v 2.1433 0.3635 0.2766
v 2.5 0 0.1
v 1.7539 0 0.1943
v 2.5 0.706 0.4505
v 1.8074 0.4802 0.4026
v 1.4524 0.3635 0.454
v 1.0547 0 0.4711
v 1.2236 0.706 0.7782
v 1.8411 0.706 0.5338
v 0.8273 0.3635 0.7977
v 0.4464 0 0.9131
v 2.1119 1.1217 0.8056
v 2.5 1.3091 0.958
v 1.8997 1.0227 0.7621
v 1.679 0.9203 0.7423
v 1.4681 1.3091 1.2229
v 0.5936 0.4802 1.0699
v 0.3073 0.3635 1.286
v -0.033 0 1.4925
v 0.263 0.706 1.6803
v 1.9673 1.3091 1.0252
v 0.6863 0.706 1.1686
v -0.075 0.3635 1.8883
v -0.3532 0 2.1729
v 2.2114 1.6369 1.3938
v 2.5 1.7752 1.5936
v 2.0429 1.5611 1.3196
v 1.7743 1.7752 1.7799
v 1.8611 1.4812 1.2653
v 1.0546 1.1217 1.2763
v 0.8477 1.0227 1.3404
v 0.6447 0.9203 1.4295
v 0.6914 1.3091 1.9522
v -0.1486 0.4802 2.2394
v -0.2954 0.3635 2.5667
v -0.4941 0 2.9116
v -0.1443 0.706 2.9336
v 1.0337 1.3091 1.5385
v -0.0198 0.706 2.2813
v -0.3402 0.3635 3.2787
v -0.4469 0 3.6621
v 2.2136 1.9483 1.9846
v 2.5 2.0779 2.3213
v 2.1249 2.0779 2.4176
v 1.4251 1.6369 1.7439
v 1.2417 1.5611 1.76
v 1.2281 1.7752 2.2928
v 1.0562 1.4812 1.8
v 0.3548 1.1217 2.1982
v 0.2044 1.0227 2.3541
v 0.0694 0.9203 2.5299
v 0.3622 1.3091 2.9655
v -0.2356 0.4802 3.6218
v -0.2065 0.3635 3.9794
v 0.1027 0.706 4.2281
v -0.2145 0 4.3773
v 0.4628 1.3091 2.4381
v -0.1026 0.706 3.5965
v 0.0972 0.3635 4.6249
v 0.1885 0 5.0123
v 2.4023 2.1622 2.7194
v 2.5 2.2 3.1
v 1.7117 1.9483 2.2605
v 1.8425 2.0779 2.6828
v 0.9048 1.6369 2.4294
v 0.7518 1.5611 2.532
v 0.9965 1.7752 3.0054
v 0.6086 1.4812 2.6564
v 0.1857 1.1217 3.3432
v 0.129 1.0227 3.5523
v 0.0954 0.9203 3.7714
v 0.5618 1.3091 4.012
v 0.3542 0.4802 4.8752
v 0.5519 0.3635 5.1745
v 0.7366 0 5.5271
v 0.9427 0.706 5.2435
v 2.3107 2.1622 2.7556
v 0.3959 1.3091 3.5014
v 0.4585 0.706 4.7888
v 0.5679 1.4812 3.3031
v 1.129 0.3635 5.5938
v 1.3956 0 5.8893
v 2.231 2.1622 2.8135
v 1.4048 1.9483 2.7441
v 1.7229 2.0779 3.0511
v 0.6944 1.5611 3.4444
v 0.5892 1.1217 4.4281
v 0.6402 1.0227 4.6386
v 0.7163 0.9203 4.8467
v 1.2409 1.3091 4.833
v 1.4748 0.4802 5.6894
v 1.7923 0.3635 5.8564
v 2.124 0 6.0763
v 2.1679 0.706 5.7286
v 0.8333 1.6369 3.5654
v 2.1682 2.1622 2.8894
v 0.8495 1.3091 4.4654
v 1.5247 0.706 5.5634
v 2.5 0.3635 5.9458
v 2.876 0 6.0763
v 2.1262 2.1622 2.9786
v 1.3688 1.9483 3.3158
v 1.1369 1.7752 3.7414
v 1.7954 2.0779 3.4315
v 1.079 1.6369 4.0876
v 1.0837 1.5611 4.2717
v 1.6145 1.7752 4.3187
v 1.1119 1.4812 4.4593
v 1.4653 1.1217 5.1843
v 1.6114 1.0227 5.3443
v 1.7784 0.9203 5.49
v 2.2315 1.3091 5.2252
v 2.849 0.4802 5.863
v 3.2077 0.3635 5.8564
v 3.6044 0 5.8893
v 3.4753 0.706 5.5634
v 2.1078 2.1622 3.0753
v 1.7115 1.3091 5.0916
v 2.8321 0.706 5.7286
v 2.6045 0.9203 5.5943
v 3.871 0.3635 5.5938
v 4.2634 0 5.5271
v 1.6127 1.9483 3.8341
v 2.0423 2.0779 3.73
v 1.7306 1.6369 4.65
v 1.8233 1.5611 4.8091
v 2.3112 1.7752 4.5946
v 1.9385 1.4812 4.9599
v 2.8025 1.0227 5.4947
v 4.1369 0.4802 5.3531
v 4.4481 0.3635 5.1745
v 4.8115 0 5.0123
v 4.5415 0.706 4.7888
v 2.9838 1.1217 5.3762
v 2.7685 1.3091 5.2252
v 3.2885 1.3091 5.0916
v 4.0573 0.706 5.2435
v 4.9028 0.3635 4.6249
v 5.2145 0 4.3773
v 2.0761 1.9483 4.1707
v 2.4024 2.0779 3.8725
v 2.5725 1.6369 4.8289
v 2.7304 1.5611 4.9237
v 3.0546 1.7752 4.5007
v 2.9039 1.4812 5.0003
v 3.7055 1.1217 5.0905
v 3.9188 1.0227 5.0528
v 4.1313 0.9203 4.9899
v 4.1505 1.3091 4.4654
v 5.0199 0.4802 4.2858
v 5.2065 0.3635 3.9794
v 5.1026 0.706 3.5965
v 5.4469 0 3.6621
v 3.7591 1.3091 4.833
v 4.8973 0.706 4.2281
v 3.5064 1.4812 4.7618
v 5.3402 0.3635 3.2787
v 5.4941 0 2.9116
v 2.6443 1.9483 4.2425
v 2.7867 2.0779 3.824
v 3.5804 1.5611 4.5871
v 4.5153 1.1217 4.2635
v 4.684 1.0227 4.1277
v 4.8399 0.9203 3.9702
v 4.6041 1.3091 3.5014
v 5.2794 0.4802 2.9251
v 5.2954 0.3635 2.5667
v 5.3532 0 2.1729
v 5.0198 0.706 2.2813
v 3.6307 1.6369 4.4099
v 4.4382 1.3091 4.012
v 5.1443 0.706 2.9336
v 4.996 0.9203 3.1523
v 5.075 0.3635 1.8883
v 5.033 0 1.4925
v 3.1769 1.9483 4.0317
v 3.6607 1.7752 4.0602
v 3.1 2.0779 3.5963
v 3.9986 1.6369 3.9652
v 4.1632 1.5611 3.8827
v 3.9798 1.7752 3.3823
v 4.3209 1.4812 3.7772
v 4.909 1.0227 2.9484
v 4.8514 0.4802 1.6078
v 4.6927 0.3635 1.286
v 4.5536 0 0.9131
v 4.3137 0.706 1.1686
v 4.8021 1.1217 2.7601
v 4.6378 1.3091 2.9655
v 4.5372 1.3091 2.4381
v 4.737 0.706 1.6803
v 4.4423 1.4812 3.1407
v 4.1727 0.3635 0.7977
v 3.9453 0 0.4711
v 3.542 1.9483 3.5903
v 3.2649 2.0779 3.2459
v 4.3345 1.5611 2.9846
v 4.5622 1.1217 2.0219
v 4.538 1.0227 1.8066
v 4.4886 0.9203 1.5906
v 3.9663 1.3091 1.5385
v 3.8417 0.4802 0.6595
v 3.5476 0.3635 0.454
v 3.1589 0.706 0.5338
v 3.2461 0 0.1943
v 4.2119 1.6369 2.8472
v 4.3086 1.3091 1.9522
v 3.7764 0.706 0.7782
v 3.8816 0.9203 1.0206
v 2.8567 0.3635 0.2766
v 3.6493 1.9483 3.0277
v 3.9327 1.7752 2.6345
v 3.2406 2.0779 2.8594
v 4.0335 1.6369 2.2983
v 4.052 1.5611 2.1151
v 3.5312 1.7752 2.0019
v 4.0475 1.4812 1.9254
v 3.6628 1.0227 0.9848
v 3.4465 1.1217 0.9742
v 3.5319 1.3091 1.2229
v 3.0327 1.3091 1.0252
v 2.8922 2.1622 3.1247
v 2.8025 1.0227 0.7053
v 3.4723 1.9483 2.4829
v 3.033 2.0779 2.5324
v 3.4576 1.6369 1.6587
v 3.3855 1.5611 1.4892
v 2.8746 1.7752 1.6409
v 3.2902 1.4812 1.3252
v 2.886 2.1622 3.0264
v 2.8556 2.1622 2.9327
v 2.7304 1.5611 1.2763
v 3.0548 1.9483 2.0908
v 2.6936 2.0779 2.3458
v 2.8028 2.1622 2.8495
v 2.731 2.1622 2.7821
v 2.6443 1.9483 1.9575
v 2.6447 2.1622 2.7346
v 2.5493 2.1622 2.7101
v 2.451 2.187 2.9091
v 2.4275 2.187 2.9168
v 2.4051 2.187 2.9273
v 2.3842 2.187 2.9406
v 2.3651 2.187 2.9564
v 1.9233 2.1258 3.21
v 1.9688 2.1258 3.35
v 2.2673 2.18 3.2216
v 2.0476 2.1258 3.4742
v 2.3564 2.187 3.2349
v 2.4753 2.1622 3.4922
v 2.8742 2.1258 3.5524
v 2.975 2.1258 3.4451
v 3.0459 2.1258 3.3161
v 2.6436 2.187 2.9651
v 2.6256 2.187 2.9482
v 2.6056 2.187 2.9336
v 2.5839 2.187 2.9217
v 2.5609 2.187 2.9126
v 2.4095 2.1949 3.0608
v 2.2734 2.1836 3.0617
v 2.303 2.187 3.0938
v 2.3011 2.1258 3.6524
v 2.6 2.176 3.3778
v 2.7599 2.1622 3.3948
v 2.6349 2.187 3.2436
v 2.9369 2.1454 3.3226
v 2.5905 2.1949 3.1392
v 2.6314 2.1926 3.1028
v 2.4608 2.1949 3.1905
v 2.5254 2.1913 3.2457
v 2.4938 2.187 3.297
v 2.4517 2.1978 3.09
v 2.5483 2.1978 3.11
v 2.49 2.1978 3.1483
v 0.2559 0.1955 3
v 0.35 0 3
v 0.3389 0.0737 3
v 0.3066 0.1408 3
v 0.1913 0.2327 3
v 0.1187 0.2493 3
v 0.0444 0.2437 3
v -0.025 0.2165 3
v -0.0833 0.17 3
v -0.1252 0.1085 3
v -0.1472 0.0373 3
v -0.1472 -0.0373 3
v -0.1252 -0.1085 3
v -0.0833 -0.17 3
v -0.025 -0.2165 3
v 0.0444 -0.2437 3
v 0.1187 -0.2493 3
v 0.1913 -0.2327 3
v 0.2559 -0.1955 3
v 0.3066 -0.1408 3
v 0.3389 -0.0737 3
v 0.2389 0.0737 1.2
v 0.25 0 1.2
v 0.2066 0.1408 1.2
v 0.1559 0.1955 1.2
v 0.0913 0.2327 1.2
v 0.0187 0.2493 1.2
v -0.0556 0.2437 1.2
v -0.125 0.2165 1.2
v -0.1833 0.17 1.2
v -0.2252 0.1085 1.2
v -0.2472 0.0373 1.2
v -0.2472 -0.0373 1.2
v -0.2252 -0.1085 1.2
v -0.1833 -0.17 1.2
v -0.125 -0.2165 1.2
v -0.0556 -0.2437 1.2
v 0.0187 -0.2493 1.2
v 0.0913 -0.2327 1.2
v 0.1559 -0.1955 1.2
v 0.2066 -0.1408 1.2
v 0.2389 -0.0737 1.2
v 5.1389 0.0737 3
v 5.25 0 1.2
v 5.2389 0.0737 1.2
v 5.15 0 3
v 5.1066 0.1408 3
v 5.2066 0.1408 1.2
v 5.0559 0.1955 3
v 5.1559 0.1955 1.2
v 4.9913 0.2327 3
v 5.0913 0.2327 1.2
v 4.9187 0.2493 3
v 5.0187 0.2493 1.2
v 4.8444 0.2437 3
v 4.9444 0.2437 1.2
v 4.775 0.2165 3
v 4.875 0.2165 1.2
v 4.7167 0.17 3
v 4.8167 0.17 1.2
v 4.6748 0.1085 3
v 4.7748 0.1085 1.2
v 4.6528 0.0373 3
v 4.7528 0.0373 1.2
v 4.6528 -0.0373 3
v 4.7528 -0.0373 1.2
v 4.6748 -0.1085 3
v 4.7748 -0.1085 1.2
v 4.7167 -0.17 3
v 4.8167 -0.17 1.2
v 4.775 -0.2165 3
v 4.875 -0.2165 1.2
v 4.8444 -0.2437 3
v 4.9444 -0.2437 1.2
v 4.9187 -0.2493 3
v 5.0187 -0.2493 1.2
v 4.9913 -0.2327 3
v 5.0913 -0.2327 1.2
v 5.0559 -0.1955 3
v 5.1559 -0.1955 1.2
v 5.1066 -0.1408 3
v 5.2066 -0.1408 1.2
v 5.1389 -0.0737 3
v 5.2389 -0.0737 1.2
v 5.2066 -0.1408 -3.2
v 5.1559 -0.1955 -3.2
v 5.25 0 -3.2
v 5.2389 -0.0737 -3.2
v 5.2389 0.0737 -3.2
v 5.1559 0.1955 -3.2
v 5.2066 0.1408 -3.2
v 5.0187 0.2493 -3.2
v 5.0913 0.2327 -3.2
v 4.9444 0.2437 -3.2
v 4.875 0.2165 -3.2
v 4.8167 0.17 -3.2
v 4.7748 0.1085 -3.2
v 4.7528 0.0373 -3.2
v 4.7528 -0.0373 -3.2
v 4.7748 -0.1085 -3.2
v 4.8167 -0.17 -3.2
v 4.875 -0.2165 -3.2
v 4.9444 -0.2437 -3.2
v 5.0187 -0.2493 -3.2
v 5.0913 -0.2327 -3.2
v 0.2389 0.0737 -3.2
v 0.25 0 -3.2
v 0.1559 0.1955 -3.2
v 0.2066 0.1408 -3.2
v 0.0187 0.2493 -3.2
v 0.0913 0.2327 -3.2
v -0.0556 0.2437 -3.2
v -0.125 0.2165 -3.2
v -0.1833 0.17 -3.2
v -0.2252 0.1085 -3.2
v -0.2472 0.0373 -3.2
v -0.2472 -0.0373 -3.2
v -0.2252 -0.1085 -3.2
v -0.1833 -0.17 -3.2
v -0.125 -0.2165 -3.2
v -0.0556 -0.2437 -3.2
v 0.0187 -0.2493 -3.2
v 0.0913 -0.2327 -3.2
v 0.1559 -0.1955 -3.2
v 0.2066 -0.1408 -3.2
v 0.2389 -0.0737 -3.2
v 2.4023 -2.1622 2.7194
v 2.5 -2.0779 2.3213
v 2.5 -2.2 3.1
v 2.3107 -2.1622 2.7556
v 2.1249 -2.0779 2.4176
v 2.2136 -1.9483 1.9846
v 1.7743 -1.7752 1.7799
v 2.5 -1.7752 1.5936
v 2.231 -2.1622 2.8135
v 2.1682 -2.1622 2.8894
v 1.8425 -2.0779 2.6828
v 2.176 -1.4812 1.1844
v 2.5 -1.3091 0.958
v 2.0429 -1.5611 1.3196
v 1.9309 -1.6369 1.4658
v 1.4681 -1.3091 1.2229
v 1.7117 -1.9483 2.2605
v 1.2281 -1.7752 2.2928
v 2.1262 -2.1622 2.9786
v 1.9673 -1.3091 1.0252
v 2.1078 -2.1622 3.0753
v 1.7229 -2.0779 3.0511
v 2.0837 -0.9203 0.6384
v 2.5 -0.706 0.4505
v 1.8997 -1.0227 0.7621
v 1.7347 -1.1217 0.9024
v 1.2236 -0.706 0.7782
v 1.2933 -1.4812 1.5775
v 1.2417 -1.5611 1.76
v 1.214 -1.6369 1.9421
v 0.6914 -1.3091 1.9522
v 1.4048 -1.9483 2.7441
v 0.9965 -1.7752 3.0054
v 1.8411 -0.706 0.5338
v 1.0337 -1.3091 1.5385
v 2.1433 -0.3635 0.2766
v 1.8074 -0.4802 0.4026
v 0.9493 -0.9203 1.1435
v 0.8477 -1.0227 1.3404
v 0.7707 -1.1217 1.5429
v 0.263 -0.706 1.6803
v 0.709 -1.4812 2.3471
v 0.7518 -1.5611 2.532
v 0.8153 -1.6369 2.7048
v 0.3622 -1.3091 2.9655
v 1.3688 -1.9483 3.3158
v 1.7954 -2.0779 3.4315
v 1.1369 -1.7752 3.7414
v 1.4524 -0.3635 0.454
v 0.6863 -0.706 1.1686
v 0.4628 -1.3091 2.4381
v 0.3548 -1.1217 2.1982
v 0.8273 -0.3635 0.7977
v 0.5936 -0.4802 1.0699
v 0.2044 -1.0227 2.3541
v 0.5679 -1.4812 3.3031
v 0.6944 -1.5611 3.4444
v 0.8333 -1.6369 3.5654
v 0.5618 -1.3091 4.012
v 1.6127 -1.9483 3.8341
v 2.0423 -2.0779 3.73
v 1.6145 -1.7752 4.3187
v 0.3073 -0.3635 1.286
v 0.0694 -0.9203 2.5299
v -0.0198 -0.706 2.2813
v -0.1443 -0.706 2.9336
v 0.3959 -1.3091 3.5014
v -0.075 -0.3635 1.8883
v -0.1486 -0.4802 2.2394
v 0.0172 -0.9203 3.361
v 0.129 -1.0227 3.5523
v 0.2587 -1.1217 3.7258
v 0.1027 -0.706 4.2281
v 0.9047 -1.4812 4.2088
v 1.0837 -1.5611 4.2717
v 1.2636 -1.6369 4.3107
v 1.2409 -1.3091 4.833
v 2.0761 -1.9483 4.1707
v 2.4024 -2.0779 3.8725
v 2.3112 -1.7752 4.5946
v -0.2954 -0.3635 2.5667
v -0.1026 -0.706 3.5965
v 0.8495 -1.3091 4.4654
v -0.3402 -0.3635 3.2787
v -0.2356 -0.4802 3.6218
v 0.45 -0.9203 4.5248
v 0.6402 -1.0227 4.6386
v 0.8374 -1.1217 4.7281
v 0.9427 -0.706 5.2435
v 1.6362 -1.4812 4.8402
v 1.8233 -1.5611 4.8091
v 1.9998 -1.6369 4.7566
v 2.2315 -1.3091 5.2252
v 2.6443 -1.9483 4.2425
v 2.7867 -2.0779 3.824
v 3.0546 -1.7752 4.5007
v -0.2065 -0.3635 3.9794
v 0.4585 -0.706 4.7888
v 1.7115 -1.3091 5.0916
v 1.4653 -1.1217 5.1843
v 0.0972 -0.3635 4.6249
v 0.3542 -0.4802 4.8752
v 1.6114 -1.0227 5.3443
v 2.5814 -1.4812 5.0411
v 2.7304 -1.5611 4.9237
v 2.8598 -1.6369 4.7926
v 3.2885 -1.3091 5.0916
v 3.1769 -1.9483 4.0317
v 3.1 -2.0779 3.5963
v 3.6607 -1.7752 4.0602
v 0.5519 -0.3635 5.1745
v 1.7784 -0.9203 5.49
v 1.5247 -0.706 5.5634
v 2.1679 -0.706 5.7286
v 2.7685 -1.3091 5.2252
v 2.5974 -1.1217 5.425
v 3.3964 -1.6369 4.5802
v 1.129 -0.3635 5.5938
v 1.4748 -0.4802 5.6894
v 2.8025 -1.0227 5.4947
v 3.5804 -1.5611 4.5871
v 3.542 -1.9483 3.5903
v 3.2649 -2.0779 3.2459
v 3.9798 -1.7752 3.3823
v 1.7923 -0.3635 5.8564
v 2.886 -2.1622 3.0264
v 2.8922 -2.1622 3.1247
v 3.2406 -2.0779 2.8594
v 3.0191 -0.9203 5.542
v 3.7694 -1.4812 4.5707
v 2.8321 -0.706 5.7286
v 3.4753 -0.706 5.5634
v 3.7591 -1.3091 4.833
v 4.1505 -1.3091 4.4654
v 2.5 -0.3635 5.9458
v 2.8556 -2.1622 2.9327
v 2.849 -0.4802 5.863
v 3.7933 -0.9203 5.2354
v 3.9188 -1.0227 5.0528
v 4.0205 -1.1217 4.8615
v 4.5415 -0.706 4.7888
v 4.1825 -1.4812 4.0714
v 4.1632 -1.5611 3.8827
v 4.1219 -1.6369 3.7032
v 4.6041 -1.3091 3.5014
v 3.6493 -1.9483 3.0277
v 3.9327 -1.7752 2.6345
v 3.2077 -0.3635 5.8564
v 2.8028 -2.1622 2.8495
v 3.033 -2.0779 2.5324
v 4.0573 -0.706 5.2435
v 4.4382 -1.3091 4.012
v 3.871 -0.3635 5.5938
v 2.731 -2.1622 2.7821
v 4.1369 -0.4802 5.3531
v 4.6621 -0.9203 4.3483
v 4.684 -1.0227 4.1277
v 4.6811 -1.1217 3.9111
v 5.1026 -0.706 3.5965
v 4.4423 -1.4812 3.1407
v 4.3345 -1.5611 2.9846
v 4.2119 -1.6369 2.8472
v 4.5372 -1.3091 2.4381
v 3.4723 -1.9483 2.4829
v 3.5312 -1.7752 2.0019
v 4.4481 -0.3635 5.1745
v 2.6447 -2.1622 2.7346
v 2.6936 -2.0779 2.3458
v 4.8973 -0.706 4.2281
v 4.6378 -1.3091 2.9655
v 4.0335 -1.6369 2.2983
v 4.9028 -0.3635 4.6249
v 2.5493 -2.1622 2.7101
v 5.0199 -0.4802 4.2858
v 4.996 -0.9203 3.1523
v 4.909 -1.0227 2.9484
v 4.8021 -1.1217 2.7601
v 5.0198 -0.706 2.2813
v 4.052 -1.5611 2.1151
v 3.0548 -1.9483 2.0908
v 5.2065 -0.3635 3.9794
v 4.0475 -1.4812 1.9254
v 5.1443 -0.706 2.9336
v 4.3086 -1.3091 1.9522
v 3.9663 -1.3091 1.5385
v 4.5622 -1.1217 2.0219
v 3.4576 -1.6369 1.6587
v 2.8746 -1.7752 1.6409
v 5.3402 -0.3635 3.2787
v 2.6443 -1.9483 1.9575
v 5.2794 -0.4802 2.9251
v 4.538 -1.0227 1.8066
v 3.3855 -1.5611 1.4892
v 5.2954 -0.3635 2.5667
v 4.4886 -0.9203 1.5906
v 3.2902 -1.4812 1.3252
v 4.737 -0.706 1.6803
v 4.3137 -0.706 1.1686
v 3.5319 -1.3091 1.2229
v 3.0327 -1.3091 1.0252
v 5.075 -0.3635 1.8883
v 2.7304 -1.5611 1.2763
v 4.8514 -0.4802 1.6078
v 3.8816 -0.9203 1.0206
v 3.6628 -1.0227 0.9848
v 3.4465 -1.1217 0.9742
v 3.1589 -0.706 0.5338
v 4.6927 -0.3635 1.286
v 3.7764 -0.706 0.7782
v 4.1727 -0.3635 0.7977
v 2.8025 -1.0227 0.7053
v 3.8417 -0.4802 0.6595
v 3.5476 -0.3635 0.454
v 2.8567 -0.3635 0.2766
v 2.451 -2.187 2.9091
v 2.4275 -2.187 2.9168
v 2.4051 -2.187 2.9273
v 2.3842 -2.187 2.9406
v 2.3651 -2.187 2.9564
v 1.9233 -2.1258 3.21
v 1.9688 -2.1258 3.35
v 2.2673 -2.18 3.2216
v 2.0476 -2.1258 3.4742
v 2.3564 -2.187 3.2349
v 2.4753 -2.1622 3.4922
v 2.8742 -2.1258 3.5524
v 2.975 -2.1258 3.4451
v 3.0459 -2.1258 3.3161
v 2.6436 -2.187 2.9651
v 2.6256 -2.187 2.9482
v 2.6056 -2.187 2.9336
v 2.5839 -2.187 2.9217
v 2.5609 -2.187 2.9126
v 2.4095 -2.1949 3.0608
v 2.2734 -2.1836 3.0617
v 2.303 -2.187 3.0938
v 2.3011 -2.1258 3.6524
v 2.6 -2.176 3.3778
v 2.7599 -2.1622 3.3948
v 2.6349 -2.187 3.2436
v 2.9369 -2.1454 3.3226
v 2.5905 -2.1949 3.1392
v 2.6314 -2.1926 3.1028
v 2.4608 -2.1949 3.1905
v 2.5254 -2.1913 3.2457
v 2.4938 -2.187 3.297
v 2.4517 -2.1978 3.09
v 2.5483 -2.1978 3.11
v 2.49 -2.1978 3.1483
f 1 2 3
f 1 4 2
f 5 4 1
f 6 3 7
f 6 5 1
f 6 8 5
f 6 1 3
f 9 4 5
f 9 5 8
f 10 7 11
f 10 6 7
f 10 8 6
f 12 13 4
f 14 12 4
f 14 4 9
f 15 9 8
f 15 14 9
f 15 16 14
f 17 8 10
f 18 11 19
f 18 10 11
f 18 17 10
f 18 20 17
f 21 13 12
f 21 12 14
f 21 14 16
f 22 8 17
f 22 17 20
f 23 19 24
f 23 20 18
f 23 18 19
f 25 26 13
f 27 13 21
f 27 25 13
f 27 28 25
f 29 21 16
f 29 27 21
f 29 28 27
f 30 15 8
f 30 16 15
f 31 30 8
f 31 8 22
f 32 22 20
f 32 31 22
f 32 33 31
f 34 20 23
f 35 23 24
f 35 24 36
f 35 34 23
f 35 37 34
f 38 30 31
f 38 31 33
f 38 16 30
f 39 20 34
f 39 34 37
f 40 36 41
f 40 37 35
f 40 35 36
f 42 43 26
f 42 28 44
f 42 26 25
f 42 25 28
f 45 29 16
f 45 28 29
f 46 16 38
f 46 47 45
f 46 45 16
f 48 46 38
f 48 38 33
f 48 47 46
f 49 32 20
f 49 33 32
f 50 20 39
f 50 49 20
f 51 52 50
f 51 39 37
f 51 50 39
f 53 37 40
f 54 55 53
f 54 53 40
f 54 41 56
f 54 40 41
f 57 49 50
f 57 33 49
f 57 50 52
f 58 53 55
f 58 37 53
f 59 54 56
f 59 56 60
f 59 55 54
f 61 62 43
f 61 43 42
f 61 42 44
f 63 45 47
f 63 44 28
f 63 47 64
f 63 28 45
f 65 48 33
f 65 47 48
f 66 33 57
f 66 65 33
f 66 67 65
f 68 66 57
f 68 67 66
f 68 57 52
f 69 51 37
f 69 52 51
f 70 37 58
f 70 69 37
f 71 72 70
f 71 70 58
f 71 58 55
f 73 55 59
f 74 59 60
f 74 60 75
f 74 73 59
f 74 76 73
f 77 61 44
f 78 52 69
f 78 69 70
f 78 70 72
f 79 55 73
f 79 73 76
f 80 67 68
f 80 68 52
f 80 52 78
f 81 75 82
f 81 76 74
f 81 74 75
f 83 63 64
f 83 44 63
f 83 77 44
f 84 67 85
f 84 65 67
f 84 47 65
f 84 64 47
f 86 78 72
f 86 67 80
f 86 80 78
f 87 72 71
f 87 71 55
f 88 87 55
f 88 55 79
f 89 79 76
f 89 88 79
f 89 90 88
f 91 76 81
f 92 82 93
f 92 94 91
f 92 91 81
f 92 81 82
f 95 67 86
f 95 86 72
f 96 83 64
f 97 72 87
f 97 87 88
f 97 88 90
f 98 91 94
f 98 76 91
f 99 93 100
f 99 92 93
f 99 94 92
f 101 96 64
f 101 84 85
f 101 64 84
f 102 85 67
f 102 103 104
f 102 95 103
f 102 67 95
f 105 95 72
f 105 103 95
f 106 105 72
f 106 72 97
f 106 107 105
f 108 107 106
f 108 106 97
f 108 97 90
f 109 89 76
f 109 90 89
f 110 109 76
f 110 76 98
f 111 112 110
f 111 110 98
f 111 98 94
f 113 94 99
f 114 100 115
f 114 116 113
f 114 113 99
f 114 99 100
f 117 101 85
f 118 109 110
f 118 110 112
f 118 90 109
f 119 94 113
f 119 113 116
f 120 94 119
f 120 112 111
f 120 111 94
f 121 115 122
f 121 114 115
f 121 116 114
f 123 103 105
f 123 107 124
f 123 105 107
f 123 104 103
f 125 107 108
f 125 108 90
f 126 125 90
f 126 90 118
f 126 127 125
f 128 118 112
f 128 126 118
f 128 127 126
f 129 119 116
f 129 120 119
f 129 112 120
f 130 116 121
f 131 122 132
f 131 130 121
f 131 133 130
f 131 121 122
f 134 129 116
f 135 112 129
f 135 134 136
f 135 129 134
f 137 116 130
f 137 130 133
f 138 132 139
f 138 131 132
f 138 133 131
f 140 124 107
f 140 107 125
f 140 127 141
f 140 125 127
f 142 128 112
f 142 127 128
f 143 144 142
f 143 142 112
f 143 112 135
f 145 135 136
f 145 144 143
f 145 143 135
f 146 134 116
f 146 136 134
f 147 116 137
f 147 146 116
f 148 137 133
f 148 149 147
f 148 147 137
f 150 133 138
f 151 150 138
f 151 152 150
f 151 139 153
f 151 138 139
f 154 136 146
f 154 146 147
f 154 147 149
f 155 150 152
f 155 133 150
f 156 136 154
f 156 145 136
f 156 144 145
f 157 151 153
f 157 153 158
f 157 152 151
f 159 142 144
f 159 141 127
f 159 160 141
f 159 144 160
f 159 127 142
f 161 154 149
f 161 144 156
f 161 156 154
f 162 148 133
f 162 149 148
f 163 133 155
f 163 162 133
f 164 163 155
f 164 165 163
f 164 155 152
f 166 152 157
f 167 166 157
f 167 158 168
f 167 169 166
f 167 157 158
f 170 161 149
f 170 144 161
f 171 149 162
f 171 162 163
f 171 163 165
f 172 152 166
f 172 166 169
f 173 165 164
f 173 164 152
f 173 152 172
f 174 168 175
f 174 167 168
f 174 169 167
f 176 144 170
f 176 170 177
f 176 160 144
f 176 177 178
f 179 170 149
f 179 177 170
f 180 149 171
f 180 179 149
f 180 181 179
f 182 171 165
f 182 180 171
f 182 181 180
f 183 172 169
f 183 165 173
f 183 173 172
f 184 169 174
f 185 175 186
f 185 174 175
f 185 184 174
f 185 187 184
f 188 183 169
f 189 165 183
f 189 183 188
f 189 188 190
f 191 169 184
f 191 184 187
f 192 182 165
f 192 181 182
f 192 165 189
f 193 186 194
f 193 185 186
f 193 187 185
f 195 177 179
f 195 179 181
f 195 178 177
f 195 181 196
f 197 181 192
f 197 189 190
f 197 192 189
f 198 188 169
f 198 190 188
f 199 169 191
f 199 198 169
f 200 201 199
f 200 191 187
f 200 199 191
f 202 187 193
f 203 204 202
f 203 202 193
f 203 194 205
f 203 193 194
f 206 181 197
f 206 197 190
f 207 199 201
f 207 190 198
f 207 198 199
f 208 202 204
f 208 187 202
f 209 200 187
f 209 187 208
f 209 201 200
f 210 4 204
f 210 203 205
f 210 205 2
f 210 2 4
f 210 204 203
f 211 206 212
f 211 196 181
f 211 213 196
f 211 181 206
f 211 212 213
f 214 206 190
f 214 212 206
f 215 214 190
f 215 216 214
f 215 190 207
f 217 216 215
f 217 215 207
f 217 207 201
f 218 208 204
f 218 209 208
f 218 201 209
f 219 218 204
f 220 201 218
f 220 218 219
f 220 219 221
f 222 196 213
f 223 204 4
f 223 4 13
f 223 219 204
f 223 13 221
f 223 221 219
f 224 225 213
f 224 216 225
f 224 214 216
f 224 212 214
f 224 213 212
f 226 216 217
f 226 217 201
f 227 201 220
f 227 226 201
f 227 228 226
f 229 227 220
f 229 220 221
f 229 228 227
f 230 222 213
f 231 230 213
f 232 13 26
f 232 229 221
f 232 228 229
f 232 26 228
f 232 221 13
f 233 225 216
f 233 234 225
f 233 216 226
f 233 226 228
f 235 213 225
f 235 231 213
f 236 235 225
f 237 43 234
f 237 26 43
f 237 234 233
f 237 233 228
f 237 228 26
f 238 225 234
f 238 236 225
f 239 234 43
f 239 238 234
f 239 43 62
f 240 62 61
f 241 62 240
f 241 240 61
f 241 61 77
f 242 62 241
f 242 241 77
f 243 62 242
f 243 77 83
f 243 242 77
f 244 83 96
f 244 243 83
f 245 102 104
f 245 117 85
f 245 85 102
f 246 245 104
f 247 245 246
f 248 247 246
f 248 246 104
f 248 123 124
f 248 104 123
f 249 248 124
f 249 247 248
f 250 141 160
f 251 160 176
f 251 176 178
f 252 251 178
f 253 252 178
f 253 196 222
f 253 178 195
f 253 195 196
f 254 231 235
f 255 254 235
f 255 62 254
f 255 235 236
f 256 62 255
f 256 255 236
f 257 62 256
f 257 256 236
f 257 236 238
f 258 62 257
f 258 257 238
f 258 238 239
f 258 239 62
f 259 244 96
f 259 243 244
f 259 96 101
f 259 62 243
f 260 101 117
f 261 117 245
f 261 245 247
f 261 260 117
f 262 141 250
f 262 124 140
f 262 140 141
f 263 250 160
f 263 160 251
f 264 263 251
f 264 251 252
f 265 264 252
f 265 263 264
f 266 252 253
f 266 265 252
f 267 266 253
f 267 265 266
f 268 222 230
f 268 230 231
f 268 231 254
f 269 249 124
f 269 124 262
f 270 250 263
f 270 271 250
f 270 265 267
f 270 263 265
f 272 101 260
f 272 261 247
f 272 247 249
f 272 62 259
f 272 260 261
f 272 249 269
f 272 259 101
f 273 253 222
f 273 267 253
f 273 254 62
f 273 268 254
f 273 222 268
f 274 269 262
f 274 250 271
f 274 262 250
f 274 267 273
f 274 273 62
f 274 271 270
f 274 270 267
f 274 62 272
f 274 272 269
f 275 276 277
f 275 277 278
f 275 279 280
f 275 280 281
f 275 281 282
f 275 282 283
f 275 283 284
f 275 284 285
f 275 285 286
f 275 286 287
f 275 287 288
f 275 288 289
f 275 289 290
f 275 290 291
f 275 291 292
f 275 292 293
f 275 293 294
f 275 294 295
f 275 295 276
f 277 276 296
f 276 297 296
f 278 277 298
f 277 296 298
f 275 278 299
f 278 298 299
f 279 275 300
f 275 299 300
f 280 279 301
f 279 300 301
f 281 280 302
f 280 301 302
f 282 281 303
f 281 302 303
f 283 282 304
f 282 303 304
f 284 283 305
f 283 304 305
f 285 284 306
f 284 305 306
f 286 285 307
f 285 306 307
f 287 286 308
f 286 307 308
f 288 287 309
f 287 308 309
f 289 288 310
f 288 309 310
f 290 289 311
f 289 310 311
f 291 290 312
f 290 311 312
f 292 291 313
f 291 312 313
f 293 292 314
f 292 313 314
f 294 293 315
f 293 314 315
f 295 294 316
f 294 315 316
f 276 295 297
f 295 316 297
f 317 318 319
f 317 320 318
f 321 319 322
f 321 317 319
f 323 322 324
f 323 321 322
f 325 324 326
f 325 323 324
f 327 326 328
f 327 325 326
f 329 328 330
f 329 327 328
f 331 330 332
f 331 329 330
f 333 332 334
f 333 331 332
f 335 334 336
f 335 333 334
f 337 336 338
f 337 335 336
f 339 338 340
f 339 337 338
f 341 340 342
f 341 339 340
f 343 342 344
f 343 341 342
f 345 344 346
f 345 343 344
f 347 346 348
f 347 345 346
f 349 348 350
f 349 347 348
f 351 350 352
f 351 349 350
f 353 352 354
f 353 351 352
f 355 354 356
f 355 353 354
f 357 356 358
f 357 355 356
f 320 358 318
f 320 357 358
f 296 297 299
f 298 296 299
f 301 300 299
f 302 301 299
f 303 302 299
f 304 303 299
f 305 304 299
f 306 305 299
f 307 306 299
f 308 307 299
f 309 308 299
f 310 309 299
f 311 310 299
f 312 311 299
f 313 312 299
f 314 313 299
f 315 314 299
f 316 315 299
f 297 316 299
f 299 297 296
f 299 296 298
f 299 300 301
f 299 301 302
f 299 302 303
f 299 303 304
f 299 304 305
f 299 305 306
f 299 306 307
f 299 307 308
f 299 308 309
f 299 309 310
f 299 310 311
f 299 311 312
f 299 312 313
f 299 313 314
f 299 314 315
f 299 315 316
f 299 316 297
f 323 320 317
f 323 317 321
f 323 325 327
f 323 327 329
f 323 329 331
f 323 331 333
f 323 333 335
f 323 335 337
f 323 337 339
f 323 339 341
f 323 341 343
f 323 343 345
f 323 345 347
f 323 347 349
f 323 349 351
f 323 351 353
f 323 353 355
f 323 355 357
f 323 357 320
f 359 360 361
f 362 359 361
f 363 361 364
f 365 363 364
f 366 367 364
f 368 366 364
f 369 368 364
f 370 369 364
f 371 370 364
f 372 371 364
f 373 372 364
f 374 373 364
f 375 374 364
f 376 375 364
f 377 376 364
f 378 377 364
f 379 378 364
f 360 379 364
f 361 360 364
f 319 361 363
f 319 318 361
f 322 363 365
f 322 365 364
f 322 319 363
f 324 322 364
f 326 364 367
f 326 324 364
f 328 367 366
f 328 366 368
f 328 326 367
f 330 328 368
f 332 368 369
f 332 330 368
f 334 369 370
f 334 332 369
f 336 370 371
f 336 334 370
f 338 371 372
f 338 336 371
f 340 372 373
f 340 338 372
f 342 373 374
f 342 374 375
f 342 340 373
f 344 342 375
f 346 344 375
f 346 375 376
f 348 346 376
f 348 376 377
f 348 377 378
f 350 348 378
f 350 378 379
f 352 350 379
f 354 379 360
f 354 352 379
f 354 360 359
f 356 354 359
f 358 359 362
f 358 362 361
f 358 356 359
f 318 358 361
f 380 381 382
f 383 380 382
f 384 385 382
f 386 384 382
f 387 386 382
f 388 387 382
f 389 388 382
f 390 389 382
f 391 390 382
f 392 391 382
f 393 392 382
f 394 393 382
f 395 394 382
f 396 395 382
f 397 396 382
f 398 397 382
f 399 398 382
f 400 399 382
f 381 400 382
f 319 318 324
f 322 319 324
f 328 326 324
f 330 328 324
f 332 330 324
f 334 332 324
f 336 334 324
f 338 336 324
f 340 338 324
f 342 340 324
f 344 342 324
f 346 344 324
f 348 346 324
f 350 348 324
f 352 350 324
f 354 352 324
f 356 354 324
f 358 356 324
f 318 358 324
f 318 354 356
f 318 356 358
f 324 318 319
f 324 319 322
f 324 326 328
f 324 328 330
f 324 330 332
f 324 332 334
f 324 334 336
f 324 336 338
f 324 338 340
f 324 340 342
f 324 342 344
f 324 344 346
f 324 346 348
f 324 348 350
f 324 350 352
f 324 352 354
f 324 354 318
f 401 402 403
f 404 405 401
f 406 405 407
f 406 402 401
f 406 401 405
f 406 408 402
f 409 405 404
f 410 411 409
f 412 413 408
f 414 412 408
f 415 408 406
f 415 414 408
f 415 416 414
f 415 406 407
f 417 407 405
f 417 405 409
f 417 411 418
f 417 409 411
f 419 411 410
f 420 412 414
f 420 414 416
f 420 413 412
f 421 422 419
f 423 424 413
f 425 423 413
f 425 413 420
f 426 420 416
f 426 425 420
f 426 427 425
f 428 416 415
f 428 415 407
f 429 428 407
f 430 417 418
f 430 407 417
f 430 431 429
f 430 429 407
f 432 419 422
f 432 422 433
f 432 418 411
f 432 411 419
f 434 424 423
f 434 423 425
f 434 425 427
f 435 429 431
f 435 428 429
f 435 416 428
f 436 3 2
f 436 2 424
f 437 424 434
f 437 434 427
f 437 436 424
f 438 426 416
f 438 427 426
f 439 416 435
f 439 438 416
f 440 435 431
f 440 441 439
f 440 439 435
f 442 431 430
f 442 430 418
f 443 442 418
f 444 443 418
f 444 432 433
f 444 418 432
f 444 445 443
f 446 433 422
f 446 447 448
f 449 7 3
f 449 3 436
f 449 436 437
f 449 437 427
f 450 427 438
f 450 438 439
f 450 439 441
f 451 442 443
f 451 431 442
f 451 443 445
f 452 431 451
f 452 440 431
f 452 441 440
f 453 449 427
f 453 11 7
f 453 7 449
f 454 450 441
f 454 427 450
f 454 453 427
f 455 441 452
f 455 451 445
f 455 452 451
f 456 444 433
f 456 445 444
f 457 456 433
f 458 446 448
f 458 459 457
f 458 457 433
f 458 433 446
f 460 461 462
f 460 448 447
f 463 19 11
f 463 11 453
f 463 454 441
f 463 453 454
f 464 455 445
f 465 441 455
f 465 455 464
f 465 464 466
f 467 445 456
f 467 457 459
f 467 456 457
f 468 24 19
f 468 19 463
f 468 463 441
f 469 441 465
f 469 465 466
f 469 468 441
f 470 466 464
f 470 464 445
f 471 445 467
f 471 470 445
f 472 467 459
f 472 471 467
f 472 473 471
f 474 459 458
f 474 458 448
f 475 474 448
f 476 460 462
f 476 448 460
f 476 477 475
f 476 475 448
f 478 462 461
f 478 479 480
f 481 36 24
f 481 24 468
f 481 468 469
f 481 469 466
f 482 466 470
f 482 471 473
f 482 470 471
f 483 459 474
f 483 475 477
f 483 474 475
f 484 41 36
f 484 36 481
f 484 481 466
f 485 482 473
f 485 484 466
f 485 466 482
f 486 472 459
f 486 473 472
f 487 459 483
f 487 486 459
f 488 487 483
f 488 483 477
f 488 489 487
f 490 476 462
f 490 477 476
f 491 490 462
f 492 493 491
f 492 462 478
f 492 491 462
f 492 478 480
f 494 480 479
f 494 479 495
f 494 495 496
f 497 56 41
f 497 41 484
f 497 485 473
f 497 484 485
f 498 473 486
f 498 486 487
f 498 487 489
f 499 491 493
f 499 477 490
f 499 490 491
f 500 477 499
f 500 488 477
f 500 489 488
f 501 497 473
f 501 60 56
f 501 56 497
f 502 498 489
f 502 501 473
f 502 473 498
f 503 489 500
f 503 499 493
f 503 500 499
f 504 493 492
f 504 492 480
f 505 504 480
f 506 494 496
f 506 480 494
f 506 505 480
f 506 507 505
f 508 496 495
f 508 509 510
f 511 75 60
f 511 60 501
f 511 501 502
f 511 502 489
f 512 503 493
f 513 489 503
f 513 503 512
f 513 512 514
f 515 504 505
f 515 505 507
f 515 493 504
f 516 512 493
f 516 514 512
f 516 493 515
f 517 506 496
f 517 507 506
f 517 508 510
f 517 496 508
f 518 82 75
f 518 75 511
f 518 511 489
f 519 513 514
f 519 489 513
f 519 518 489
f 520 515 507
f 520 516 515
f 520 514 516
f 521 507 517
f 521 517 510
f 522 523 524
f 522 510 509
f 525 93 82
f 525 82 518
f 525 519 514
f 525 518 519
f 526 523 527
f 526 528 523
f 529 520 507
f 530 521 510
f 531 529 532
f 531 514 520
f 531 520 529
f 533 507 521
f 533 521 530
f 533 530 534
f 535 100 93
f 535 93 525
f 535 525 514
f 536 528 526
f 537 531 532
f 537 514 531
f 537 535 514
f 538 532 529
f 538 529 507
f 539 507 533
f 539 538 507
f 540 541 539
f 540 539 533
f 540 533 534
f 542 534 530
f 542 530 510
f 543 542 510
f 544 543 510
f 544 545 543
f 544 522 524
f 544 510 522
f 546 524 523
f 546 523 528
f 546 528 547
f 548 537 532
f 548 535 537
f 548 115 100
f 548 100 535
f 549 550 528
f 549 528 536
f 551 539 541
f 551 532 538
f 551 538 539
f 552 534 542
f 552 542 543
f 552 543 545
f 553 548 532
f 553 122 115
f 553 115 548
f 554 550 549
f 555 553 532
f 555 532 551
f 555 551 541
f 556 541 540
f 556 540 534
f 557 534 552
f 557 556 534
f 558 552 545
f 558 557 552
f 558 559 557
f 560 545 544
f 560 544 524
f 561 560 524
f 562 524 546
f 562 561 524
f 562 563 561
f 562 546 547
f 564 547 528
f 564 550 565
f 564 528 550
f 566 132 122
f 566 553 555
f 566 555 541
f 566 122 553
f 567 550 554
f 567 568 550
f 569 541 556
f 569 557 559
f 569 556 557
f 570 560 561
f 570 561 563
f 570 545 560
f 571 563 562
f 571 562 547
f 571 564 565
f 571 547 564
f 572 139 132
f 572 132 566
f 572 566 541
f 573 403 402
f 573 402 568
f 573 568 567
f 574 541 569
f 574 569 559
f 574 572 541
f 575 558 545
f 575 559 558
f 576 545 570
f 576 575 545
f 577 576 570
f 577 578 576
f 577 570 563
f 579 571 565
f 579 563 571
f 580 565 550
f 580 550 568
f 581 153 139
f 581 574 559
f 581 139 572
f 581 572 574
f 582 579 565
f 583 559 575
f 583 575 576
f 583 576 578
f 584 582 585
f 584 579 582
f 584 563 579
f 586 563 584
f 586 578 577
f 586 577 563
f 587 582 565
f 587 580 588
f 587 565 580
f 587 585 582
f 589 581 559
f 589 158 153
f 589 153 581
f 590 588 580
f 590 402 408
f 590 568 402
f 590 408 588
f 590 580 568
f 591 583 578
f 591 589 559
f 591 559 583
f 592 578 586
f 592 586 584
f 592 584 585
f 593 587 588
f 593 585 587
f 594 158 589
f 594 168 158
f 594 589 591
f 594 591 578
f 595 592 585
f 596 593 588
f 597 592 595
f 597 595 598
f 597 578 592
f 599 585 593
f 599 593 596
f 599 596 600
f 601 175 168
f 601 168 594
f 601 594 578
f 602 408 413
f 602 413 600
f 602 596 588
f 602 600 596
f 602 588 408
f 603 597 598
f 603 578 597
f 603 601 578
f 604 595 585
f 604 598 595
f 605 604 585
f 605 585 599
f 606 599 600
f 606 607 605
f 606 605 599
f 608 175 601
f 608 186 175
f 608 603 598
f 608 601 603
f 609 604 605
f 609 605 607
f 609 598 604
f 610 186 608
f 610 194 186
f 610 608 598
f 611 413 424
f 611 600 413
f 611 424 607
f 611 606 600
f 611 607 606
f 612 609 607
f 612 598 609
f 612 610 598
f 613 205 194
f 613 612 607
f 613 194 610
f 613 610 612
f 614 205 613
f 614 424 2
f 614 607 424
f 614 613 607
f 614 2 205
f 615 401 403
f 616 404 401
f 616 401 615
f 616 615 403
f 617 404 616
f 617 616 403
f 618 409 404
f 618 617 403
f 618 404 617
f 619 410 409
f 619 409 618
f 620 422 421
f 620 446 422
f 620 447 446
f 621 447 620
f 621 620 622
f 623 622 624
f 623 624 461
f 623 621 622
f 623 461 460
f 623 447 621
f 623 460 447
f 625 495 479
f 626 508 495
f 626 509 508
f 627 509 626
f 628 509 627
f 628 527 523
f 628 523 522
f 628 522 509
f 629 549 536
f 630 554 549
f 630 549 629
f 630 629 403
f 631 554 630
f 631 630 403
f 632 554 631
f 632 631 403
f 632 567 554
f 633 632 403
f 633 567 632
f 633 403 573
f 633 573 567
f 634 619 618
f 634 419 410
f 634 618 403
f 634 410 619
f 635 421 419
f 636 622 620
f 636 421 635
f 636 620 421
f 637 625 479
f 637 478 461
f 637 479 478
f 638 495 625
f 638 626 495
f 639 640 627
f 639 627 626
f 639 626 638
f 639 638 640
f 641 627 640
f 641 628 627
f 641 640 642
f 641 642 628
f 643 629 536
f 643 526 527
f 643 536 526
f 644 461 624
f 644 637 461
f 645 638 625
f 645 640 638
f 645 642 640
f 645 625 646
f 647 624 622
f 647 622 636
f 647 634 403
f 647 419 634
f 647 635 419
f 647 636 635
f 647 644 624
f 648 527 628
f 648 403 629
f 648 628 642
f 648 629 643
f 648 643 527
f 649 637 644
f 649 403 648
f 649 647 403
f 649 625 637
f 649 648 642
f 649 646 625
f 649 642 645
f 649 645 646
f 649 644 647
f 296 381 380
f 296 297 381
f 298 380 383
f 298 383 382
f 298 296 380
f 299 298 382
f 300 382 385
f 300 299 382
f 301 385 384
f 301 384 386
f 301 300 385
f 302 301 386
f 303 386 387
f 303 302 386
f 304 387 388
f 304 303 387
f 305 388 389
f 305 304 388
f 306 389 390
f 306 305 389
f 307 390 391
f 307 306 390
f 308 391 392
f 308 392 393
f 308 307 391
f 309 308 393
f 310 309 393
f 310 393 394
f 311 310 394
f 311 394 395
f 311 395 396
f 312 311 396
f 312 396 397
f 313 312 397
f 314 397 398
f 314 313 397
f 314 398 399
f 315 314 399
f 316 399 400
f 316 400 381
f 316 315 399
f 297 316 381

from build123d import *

# Parameters (mm, degrees)
SKETCH001_R       = 0.25
PAD001_DEPTH      = 1.2
PAD001_DEPTH_BACK = 3.2
SKETCH002_R       = 0.25
SKETCH003_R       = 0.25
SKETCH004_R       = 0.25
SKETCH005_R       = 0.25


with BuildPart() as pad001:
    # Sketch001 → Pad001 (new body, two sides)
    with BuildSketch(Plane.XY) as pad001_sk:
        Circle(SKETCH001_R)
        with Locations((5, 0)):
            Circle(SKETCH001_R)
    extrude(amount=PAD001_DEPTH)
    extrude(pad001_sk.sketch, amount=-PAD001_DEPTH_BACK)


with BuildPart() as revolution:
    # Sketch → Revolution (revolve)
    with BuildSketch(Plane.YZ.offset(2.5)):
        with BuildLine():
            Line((-2.2, 3.1), (2.2, 3.1))
            ThreePointArc((0, 0.1), (1.561131, 1.261838), (2.2, 3.1))
            ThreePointArc((-2.2, 3.1), (-1.561131, 1.261838), (0, 0.1))
        make_face()
    revolve(axis=Axis((2.5, -3.32079, 3.1), (0, 1, 0)))


with BuildPart() as loft_body:
    # Sketch002 → Loft section 0
    with BuildSketch(Plane.XY.offset(3)):
        with Locations((0.1, 0)):
            Circle(SKETCH002_R)
    # Sketch003 → Loft section 1
    with BuildSketch(Plane.XY.offset(1.2)):
        Circle(SKETCH003_R)
    loft()


with BuildPart() as loft001:
    # Sketch004 → Loft001 section 0
    with BuildSketch(Plane.XY.offset(1.2)):
        with Locations((5, 0)):
            Circle(SKETCH004_R)
    # Sketch005 → Loft001 section 1
    with BuildSketch(Plane.XY.offset(3)):
        with Locations((4.9, 0)):
            Circle(SKETCH005_R)
    loft()


solid = Compound([pad001.part, revolution.part, loft_body.part, loft001.part])
